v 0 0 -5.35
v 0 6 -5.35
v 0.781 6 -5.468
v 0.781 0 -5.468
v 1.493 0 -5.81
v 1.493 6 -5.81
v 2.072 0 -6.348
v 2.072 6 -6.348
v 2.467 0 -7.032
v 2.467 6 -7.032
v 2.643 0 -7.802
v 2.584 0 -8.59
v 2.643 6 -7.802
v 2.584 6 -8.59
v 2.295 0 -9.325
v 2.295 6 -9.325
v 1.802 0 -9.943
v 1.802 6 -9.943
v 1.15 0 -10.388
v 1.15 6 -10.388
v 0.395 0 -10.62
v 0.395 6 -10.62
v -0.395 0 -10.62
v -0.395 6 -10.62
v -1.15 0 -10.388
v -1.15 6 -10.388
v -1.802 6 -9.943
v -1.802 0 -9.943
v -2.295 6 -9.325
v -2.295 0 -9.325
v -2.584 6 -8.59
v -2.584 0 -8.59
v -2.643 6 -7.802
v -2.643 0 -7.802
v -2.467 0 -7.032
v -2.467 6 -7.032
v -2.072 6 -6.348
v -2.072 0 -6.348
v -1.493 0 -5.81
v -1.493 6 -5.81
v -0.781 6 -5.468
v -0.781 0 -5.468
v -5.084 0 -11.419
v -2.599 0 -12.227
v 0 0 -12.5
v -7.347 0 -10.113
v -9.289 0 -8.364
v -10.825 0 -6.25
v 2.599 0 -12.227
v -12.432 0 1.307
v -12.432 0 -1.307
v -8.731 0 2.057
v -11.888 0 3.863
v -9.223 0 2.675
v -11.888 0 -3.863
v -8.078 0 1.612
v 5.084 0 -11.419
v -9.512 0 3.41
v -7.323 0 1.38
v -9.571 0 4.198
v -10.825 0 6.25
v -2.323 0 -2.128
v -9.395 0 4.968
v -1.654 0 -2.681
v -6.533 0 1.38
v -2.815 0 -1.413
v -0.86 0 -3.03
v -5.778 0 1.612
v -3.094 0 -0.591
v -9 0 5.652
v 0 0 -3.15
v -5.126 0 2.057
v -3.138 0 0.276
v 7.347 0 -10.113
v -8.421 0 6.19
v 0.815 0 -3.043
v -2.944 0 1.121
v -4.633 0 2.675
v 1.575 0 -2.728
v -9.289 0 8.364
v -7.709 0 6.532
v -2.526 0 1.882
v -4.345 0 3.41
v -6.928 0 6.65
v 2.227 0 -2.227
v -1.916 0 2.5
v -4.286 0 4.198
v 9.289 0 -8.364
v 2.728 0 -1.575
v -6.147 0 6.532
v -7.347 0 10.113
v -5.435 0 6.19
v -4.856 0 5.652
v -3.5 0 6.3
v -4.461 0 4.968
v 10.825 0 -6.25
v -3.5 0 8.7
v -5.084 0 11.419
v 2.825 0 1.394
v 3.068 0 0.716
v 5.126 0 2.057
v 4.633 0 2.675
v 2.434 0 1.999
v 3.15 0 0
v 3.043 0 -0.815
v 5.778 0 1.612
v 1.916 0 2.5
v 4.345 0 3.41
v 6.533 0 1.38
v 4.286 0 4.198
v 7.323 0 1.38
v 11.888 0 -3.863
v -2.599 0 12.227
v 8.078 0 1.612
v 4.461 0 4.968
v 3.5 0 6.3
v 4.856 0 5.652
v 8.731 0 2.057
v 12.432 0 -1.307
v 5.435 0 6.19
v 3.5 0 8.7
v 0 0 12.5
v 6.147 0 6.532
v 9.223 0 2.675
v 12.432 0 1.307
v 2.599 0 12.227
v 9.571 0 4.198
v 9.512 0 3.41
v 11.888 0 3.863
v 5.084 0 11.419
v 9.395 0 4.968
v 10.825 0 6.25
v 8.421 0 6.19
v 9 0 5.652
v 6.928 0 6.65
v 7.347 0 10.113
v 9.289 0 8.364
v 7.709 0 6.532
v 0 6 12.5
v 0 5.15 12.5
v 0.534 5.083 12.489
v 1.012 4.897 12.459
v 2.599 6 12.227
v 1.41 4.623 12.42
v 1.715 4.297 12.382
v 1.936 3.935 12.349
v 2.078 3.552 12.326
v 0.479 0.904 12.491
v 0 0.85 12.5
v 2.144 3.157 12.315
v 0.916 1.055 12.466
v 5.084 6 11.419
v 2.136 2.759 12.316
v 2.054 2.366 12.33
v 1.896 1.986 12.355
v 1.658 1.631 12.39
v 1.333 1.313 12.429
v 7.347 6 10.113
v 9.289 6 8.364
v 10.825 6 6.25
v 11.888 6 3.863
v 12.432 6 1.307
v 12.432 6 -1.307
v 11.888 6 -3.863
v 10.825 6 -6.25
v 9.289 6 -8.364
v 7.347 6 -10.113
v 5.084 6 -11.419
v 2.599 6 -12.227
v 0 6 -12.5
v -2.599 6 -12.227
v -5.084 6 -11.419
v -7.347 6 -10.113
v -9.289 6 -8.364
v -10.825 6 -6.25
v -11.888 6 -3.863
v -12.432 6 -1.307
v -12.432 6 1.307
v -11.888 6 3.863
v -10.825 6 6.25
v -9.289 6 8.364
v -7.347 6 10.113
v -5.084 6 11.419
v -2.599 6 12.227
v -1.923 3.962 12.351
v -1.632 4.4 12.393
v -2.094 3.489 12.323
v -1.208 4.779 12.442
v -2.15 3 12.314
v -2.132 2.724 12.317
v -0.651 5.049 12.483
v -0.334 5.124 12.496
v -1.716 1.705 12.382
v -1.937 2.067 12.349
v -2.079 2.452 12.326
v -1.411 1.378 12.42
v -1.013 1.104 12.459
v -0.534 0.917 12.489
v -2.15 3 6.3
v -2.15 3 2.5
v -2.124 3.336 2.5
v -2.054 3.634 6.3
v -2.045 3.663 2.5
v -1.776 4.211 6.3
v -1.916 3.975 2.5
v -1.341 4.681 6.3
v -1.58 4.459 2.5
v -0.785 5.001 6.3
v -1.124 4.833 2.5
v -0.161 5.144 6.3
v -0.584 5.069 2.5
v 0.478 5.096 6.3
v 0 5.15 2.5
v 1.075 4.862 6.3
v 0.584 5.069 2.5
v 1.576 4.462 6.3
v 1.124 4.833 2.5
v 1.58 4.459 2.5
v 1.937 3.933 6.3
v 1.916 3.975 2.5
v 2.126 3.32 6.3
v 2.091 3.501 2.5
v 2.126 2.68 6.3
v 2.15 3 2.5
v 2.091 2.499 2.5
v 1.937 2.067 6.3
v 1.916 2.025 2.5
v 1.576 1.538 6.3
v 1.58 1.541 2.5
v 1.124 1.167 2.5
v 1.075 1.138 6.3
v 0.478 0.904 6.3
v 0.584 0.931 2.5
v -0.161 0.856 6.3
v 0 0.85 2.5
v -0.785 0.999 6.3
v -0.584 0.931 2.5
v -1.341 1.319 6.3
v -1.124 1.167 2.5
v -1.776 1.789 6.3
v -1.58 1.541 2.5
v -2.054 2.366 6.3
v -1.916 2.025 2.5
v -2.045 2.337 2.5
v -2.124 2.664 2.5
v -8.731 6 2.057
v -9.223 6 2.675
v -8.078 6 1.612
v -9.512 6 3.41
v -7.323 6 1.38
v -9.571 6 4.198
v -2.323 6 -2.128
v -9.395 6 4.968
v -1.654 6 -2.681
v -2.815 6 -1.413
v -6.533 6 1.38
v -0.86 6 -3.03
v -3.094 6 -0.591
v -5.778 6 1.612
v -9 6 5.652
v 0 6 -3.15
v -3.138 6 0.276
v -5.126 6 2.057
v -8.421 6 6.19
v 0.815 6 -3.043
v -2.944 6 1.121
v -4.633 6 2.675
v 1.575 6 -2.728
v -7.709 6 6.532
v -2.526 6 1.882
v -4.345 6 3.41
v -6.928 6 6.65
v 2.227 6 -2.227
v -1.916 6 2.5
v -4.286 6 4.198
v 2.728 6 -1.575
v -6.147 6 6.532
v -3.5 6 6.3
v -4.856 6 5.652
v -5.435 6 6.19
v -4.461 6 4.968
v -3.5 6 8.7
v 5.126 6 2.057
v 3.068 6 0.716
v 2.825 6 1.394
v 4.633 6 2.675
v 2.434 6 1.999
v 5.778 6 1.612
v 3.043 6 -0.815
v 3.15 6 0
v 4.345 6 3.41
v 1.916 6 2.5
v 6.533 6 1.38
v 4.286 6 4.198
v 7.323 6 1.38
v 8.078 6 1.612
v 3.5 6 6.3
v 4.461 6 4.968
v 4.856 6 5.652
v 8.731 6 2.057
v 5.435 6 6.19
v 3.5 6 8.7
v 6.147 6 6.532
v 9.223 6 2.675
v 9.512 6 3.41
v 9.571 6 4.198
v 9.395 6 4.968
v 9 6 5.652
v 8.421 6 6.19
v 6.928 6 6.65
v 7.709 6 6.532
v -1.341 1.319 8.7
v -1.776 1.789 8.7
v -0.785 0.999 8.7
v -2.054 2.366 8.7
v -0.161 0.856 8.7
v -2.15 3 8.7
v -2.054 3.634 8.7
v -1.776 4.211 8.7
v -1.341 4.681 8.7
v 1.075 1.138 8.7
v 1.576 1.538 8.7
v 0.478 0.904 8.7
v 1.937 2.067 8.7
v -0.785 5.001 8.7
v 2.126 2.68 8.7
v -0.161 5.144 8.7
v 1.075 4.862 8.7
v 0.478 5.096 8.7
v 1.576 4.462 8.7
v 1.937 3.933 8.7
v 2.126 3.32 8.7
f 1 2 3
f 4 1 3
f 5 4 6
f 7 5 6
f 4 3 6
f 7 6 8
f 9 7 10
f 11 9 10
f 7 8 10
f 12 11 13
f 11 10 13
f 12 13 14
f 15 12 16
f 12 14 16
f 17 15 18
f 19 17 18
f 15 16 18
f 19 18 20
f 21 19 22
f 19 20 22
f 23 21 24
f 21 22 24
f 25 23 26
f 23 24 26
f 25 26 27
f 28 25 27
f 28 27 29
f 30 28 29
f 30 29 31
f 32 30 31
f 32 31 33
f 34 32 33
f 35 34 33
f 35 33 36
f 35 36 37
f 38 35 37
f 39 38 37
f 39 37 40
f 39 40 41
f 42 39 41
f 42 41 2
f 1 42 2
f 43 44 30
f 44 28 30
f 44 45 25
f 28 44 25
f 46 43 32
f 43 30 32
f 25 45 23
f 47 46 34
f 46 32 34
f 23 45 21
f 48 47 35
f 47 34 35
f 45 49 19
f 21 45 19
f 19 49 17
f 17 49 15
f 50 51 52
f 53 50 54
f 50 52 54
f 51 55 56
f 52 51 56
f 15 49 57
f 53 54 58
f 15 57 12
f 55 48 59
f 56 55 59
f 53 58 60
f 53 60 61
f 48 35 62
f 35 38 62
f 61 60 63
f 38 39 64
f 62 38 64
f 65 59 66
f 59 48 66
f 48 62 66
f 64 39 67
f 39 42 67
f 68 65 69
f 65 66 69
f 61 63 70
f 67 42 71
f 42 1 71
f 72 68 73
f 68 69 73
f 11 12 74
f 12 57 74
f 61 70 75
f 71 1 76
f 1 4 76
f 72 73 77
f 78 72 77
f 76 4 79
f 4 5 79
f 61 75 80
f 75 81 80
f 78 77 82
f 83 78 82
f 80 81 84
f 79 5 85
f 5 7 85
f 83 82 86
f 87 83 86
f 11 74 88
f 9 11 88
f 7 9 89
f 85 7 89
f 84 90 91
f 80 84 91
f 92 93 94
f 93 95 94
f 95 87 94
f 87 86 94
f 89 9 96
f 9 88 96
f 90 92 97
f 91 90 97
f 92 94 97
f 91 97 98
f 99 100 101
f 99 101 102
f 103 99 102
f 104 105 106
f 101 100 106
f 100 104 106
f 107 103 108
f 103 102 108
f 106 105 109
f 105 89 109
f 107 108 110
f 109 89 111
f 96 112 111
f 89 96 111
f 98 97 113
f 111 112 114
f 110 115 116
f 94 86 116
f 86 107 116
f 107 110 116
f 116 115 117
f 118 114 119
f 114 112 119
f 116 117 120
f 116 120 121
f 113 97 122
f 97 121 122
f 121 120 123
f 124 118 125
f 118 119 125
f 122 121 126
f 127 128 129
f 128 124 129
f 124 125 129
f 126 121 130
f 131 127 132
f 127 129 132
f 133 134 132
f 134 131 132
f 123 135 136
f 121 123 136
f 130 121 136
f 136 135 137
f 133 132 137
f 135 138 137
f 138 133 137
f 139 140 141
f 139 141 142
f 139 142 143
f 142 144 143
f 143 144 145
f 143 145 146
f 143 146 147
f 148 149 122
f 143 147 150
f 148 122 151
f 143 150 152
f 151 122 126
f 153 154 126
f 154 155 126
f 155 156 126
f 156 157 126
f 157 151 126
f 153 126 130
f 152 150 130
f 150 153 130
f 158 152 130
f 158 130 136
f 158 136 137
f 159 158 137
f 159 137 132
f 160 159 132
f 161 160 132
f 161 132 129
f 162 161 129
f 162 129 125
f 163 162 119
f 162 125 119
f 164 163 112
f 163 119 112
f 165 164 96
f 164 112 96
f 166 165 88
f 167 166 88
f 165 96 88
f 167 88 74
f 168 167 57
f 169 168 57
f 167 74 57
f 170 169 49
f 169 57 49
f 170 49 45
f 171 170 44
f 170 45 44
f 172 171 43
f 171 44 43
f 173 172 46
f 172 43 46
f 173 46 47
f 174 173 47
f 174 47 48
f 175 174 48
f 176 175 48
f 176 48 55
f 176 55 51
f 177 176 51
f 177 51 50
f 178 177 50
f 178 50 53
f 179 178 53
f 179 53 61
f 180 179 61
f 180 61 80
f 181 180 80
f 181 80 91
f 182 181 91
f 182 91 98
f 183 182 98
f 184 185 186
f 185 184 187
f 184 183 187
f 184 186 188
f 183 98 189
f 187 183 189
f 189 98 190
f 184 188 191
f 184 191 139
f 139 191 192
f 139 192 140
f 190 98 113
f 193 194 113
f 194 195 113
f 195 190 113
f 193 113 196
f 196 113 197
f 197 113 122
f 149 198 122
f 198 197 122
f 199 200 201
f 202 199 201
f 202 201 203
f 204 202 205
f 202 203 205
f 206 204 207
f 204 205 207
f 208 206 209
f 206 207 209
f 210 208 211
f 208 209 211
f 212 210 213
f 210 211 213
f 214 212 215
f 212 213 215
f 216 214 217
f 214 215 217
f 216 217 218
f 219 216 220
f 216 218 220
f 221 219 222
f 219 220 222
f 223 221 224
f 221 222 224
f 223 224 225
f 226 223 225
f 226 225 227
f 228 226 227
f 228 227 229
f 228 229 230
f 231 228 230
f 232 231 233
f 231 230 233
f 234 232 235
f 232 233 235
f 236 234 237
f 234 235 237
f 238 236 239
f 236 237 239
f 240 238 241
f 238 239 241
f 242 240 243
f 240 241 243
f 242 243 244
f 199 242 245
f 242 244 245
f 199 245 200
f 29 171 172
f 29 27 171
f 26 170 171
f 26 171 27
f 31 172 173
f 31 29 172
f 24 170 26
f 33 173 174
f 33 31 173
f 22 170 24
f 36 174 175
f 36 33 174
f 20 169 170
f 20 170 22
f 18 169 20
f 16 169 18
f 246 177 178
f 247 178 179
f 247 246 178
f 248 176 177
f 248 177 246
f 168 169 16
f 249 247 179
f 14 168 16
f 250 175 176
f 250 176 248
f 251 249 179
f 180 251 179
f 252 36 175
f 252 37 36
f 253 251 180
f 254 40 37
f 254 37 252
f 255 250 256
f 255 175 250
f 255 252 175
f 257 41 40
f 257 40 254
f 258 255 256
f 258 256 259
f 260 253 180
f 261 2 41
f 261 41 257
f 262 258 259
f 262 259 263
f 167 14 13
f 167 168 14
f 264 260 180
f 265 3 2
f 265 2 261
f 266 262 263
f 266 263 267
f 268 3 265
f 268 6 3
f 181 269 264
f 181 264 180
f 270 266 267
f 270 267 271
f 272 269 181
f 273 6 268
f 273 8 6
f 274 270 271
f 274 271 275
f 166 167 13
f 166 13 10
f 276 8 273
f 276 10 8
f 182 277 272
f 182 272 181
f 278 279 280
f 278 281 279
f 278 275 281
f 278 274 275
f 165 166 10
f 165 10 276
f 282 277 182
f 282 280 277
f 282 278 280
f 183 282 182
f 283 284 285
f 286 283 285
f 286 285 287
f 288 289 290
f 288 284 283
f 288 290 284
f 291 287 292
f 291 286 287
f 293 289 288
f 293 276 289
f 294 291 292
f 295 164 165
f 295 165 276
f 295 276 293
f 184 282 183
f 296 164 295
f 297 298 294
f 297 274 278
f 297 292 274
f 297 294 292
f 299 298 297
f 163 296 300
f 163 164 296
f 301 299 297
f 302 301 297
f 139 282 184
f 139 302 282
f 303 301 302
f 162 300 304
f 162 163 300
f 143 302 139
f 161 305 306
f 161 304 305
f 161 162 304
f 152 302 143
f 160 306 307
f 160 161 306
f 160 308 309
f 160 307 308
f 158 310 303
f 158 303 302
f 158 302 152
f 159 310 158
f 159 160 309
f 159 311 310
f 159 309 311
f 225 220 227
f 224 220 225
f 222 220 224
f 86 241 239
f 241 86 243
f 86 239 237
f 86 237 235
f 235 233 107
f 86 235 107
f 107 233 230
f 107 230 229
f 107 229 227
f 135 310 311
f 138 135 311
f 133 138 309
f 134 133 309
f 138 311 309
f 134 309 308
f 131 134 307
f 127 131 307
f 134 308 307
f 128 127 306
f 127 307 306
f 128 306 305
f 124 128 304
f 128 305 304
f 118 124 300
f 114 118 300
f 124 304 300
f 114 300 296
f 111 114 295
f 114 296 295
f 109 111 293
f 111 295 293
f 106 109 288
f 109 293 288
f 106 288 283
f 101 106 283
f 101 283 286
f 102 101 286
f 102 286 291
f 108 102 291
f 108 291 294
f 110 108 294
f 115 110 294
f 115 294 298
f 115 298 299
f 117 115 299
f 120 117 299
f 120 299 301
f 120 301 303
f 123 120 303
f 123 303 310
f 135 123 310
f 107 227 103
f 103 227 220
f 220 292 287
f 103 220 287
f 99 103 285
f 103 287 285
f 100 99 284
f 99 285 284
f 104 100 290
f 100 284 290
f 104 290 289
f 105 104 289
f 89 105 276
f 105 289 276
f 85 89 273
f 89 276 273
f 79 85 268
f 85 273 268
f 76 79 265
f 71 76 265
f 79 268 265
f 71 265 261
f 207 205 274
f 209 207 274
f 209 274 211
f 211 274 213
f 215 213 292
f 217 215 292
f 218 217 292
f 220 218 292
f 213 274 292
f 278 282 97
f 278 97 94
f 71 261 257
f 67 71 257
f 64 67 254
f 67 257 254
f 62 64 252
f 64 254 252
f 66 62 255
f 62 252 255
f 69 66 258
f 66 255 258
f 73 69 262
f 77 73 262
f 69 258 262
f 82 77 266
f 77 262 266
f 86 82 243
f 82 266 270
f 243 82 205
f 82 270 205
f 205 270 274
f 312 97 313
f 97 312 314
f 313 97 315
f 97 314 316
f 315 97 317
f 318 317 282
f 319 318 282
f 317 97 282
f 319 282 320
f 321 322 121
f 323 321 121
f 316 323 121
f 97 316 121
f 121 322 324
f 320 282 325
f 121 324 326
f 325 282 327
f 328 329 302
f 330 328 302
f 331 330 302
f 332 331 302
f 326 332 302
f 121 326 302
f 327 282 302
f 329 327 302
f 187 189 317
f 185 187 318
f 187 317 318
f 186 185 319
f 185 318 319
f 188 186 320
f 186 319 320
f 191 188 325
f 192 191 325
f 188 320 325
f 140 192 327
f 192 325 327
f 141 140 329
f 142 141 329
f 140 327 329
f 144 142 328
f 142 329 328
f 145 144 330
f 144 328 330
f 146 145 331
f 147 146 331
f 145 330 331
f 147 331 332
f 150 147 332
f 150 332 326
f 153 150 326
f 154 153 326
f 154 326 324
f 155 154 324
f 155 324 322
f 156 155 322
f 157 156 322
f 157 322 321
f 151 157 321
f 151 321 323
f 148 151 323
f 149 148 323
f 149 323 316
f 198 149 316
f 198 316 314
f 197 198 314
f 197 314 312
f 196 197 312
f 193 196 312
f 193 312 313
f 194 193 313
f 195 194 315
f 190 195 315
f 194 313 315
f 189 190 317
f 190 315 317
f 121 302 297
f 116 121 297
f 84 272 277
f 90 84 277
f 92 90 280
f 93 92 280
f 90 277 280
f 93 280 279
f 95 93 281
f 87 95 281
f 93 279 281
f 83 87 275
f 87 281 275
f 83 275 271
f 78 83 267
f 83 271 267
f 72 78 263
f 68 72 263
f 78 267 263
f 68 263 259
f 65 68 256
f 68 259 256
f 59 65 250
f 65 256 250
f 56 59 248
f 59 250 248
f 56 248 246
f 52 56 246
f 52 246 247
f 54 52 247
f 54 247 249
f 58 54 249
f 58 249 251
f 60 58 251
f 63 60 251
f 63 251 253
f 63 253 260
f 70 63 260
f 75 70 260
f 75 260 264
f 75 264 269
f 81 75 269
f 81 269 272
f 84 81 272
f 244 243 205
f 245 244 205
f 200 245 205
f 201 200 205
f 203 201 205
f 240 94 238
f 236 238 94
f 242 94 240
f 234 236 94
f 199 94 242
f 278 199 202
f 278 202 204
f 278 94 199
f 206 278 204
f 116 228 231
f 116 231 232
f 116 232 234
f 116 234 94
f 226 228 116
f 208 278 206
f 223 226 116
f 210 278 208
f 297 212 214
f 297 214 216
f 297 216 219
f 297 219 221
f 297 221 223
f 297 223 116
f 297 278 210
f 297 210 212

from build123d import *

# Parameters (mm, degrees)
SKETCH1_R           = 12.5
BOSS_EXTRUDE1_DEPTH = 6
CUT_EXTRUDE1_REACH  = 20.668
CUT_EXTRUDE2_REACH  = 20.668
SKETCH3_W           = 7
SKETCH3_H           = 2.4
SKETCH4_R           = 2.15
CUT_EXTRUDE3_DEPTH  = 21.426698216
SKETCH5_R           = 2.65
CUT_EXTRUDE4_DEPTH  = 19.668154869


with BuildPart() as part:
    # Sketch1 → Boss-Extrude1 (new body)
    with BuildSketch(Plane(origin=(0, 0, 0), x_dir=(1, 0, 0), z_dir=(0, 1, 0))):
        with Locations(Location((0, 0, 0), (0, 0, 270))):
            Circle(SKETCH1_R)
    extrude(amount=BOSS_EXTRUDE1_DEPTH)

    # Sketch2 → Cut-Extrude1 (cut, up to next)
    with BuildSketch(Plane(origin=(0, 6, 0), x_dir=(1, 0, 0), z_dir=(0, 1, 0)), mode=Mode.PRIVATE) as cut_extrude1_sk1:
        with BuildLine():
            ThreePointArc((0, 3.15), (-2.98307727, 1.011805317), (-1.91637679, -2.5))
            Line((-1.91637679, -2.5), (0, -2.5))
            Line((0, -2.5), (0, 3.15))
        make_face()
    cut_extrude1_tool1 = extrude(cut_extrude1_sk1.sketch, amount=-CUT_EXTRUDE1_REACH, mode=Mode.PRIVATE) & part.part
    # Sketch2 → Cut-Extrude1 (cut, up to next)
    with BuildSketch(Plane(origin=(0, 6, 0), x_dir=(1, 0, 0), z_dir=(0, 1, 0)), mode=Mode.PRIVATE) as cut_extrude1_sk2:
        with BuildLine():
            Line((0, 3.15), (0, -2.5))
            Line((0, -2.5), (1.91637679, -2.5))
            ThreePointArc((1.91637679, -2.5), (2.824808568, -1.393899766), (3.15, 0))
            ThreePointArc((3.15, 0), (2.227386361, 2.227386361), (0, 3.15))
        make_face()
    cut_extrude1_tool2 = extrude(cut_extrude1_sk2.sketch, amount=-CUT_EXTRUDE1_REACH, mode=Mode.PRIVATE) & part.part
    # Sketch2 → Cut-Extrude1 (cut, up to next)
    with BuildSketch(Plane(origin=(0, 6, 0), x_dir=(1, 0, 0), z_dir=(0, 1, 0)), mode=Mode.PRIVATE) as cut_extrude1_sk3:
        with BuildLine():
            ThreePointArc((0, 3.15), (-2.98307727, 1.011805317), (-1.91637679, -2.5))
            Line((-1.91637679, -2.5), (0, -2.5))
            Line((0, -2.5), (0, 3.15))
        make_face()
    cut_extrude1_tool3 = extrude(cut_extrude1_sk3.sketch, amount=-CUT_EXTRUDE1_REACH, mode=Mode.PRIVATE) & part.part
    # Sketch2 → Cut-Extrude1 (cut, up to next)
    with BuildSketch(Plane(origin=(0, 6, 0), x_dir=(1, 0, 0), z_dir=(0, 1, 0)), mode=Mode.PRIVATE) as cut_extrude1_sk4:
        with BuildLine():
            Line((0, 3.15), (0, -2.5))
            Line((0, -2.5), (1.91637679, -2.5))
            ThreePointArc((1.91637679, -2.5), (2.824808568, -1.393899766), (3.15, 0))
            ThreePointArc((3.15, 0), (2.227386361, 2.227386361), (0, 3.15))
        make_face()
    cut_extrude1_tool4 = extrude(cut_extrude1_sk4.sketch, amount=-CUT_EXTRUDE1_REACH, mode=Mode.PRIVATE) & part.part
    add(cut_extrude1_tool1.solids().sort_by_distance((-1.371893, 6, -0.159189))[0], mode=Mode.SUBTRACT)
    add(cut_extrude1_tool2.solids().sort_by_distance((1.371893, 6, -0.159189))[0], mode=Mode.SUBTRACT)
    add(cut_extrude1_tool3.solids().sort_by_distance((-1.371893, 6, -0.159189))[0], mode=Mode.SUBTRACT)
    add(cut_extrude1_tool4.solids().sort_by_distance((1.371893, 6, -0.159189))[0], mode=Mode.SUBTRACT)

    # Sketch3 → Cut-Extrude2 (cut, up to next)
    with BuildSketch(Plane(origin=(0, 6, 0), x_dir=(1, 0, 0), z_dir=(0, 1, 0)), mode=Mode.PRIVATE) as cut_extrude2_sk1:
        with Locations((0, -7.5)):
            Rectangle(SKETCH3_W, SKETCH3_H)
    cut_extrude2_tool1 = extrude(cut_extrude2_sk1.sketch, amount=-CUT_EXTRUDE2_REACH, mode=Mode.PRIVATE) & part.part
    add(cut_extrude2_tool1.solids().sort_by_distance((0, 6, 7.5))[0], mode=Mode.SUBTRACT)

    # Sketch4 → Cut-Extrude3 (cut, through all)
    with BuildSketch(Plane(origin=(0, 0, 2.5), x_dir=(-1, 0, 0), z_dir=(0, 0, -1))):
        with Locations((0, 3)):
            Circle(SKETCH4_R)
    extrude(amount=-CUT_EXTRUDE3_DEPTH, mode=Mode.SUBTRACT)

    # Sketch5 → Cut-Extrude4 (cut, through all)
    with BuildSketch(Plane(origin=(0, 6, 0), x_dir=(1, 0, 0), z_dir=(0, 1, 0))):
        with Locations(Location((0, 8, 0), (0, 0, 270))):
            Circle(SKETCH5_R)
        with Locations(Location((6.92820323, -4, 0), (0, 0, 270))):
            Circle(SKETCH5_R)
        with Locations(Location((-6.92820323, -4, 0), (0, 0, 270))):
            Circle(SKETCH5_R)
    extrude(amount=-CUT_EXTRUDE4_DEPTH, mode=Mode.SUBTRACT)


solid = part.part
